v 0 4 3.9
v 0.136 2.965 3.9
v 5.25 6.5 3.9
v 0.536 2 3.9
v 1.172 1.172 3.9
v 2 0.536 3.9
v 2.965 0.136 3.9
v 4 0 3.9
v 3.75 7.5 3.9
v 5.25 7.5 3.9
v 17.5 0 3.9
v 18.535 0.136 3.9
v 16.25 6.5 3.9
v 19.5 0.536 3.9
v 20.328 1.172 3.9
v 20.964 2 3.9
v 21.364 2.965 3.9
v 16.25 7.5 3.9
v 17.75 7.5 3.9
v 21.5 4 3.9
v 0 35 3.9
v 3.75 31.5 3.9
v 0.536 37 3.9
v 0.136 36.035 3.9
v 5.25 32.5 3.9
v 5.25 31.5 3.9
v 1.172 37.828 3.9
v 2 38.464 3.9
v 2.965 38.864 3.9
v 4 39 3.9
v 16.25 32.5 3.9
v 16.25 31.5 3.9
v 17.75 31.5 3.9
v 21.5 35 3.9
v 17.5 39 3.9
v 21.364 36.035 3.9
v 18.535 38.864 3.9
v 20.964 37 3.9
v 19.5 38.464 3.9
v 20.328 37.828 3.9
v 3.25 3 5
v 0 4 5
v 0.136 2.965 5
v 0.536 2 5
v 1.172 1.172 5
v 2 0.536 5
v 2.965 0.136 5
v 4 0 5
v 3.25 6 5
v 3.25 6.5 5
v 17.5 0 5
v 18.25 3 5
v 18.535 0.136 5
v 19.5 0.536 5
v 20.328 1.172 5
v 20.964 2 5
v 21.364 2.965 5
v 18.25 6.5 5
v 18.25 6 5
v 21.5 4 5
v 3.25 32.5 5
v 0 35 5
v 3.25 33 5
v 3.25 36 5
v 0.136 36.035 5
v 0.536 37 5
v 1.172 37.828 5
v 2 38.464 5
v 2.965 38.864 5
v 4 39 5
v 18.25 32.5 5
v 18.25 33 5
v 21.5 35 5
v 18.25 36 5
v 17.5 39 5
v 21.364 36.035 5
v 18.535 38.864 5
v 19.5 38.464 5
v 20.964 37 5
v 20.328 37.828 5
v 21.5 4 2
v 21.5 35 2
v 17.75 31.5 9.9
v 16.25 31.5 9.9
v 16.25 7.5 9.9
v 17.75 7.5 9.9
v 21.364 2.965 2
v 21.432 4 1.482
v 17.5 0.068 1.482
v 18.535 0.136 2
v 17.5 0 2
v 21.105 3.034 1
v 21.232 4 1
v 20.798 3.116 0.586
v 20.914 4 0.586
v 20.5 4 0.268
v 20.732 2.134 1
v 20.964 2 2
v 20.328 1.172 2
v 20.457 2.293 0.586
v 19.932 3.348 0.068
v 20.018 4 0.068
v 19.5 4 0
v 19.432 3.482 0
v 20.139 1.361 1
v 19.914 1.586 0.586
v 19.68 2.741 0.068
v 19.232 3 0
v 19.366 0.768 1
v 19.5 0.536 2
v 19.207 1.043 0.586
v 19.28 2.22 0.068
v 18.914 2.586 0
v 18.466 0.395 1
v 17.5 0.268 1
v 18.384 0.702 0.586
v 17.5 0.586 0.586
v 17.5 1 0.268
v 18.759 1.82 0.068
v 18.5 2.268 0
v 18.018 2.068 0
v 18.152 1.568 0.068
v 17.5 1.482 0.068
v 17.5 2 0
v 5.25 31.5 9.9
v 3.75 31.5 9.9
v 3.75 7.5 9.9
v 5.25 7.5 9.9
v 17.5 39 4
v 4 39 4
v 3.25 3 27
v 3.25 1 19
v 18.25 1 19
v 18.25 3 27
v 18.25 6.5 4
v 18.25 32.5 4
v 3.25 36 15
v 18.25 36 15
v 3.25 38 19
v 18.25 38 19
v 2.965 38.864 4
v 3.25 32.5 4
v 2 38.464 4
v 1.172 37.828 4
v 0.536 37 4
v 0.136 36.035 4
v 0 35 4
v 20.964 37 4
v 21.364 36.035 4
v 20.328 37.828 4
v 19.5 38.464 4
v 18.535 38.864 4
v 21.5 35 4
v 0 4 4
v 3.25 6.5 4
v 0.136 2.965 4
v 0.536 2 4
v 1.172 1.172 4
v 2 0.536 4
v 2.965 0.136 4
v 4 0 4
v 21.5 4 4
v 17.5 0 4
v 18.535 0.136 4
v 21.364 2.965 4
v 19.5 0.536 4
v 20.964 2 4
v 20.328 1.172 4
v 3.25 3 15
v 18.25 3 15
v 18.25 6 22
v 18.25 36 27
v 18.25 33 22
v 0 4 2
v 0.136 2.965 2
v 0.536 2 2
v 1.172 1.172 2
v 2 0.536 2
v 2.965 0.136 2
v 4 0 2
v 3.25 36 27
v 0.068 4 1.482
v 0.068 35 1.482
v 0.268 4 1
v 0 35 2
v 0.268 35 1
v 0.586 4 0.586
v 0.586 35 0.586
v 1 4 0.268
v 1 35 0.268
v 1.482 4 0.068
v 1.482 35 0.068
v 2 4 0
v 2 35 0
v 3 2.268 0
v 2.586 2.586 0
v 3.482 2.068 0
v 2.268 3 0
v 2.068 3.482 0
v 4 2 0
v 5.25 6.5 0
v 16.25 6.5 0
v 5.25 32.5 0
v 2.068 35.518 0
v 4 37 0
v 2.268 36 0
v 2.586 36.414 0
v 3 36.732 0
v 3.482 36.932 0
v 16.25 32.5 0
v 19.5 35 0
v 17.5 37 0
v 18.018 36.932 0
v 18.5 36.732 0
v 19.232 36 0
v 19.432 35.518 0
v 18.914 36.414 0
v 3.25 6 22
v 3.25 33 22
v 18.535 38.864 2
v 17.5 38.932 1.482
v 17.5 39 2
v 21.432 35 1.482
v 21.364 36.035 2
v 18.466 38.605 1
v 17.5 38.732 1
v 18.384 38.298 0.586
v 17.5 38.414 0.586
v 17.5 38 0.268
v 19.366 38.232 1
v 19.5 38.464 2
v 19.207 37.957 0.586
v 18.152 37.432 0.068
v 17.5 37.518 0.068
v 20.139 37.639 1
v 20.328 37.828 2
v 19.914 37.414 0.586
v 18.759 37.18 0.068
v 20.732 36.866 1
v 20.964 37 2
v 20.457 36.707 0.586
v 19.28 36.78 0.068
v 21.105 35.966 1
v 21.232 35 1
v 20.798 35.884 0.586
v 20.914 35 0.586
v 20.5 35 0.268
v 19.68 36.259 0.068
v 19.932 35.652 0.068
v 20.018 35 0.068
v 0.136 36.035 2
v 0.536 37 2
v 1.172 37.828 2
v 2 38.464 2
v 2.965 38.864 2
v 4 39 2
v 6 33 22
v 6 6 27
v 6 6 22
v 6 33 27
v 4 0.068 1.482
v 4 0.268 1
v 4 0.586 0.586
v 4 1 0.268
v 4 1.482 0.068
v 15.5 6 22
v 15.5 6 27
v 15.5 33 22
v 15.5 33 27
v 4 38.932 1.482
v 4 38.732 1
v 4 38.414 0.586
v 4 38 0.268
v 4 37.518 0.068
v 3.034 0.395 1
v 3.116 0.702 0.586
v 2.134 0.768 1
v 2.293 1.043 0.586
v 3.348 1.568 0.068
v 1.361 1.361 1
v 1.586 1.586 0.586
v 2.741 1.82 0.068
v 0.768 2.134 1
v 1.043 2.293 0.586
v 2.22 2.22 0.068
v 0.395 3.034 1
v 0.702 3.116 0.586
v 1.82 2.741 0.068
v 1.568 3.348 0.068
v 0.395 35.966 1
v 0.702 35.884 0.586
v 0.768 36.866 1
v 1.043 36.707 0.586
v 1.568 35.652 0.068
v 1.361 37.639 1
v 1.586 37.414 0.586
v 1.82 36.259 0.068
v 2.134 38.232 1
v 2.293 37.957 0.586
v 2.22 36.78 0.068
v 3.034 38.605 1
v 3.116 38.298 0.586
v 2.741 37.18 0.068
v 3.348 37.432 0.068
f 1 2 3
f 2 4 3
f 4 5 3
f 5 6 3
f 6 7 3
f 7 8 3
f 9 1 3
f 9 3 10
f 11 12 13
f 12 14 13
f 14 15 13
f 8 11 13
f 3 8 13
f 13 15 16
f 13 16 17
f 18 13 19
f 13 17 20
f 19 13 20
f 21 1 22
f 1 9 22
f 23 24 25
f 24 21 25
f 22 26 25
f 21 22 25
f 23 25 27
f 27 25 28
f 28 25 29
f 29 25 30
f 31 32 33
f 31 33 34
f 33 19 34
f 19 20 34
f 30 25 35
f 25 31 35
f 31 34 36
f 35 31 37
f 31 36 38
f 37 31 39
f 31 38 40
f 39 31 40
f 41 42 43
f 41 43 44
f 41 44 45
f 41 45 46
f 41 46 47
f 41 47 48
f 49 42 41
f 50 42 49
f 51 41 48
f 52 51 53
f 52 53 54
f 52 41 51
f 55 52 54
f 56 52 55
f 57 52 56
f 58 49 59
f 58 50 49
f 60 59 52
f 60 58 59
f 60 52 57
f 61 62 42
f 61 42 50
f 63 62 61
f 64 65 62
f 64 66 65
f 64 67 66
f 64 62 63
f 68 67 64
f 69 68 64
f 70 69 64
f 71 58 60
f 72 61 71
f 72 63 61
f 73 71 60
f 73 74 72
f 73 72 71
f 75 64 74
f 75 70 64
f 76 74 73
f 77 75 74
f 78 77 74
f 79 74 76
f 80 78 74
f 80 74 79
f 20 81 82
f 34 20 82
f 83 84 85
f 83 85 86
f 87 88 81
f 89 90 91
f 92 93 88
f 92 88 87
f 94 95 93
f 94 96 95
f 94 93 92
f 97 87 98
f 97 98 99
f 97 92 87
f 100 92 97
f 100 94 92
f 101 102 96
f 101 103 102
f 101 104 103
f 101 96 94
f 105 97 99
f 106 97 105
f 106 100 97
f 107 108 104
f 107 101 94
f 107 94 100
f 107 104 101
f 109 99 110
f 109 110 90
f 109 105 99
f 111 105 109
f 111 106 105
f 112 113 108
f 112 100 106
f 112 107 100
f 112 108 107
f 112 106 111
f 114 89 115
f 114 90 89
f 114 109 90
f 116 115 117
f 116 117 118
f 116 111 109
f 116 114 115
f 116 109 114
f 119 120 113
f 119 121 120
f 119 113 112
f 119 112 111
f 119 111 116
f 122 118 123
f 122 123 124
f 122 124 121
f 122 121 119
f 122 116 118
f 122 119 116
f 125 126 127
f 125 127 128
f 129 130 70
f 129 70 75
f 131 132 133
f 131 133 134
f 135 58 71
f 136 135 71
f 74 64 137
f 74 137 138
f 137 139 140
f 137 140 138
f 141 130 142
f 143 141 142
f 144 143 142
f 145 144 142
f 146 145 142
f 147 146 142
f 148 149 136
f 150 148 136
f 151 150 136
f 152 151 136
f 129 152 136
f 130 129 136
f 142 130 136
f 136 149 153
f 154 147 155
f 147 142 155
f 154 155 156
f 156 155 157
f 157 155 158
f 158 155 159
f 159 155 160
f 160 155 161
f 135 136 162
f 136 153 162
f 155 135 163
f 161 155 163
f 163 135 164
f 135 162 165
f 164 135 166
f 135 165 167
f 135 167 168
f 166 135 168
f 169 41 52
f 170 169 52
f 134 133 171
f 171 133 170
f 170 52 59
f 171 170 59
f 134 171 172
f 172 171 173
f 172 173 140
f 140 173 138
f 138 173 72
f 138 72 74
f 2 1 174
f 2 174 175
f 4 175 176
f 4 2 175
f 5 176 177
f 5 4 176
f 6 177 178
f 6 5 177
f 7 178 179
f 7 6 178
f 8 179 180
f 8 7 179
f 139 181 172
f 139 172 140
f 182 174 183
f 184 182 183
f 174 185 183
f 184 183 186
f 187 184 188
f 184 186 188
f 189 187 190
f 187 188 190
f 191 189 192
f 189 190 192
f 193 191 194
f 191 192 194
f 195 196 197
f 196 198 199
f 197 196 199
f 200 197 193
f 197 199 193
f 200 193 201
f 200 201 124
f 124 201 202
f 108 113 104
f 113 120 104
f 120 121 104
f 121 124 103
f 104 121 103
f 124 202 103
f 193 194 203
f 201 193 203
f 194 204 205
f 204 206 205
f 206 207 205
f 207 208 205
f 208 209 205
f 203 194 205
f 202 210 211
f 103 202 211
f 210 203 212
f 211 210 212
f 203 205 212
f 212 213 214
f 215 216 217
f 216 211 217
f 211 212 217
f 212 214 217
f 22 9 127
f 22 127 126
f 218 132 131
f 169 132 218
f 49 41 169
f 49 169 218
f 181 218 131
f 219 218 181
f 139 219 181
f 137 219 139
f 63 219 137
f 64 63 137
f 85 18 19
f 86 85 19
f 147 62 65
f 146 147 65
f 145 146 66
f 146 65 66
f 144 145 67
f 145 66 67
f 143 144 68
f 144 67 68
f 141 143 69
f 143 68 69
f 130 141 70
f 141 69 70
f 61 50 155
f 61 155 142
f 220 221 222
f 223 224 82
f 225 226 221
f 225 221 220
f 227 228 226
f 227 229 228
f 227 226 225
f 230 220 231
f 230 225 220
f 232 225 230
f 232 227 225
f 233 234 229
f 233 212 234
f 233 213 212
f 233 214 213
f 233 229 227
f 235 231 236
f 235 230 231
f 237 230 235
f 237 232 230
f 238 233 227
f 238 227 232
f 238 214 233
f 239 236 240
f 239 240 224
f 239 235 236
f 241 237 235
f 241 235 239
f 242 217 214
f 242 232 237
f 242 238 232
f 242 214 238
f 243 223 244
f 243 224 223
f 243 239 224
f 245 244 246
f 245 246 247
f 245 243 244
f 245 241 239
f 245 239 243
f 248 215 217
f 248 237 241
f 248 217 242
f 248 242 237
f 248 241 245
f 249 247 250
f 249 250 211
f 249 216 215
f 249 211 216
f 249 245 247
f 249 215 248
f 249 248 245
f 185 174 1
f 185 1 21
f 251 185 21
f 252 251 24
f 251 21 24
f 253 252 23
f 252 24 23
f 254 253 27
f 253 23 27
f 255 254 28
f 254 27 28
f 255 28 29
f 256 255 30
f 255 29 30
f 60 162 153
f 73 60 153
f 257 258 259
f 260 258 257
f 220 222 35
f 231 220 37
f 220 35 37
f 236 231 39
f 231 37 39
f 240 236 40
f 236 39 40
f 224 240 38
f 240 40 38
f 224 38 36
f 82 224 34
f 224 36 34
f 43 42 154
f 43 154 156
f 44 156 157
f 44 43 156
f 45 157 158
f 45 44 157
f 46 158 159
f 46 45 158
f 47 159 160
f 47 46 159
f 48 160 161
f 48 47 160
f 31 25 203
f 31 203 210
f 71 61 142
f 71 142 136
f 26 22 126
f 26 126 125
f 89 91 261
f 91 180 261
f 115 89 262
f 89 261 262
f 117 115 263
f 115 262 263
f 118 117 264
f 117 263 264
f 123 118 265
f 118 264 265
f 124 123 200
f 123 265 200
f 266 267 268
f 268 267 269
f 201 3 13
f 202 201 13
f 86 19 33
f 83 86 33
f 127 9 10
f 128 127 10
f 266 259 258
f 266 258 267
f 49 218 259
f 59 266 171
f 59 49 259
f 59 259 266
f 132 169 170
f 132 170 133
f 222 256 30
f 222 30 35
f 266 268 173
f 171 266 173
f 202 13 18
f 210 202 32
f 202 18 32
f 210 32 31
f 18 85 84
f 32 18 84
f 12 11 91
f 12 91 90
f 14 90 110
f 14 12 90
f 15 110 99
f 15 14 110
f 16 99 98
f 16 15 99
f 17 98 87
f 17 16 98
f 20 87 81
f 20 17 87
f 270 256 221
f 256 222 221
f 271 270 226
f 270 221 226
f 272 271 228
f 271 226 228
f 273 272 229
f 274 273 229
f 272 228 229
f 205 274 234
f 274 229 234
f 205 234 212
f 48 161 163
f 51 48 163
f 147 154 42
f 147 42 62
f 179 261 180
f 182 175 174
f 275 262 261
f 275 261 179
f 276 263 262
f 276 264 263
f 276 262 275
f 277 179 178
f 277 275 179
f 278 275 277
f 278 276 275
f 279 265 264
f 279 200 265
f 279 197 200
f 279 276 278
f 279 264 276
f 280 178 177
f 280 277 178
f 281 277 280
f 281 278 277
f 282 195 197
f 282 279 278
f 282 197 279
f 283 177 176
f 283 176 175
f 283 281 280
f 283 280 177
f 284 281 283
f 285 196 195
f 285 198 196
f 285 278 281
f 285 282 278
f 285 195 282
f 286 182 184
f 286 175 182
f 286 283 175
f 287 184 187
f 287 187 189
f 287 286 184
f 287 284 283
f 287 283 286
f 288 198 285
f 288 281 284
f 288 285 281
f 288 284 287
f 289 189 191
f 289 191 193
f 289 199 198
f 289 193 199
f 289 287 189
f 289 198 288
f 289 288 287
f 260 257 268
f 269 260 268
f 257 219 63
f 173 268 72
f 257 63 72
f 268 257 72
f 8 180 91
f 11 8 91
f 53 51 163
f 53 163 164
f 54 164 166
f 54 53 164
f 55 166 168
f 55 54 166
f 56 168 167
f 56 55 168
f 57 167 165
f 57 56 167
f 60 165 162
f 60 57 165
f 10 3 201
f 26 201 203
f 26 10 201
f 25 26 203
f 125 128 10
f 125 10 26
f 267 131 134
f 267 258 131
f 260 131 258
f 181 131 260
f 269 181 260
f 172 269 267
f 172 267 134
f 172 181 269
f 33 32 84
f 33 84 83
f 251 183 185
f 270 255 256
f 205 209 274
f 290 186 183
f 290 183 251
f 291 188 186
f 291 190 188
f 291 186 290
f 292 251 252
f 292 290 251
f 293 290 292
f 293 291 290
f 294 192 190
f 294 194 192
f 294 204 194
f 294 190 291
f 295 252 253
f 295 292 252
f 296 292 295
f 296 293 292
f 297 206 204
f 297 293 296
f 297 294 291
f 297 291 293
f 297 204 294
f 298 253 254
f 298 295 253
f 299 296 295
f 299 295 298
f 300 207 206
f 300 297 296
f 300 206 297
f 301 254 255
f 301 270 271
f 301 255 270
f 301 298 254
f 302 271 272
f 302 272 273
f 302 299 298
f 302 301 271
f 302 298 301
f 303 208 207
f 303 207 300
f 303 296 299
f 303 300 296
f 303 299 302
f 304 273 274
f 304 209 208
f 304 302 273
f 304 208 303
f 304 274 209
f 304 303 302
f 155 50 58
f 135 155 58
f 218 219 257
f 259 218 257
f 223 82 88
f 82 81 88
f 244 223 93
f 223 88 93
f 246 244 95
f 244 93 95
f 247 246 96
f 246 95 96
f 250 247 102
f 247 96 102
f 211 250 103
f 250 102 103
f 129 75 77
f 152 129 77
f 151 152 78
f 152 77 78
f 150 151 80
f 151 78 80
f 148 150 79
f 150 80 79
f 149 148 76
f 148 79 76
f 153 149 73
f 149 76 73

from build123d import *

# Parameters (mm, degrees)
F0_W      = 21.5
F0_H      = 39
F1_DEPTH  = 5
F2_W      = 15
F2_H      = 3
F3_DEPTH  = 22
F5_DEPTH  = 15
F6_R      = 4
F7_R      = 2
F8_W      = 11
F8_H      = 26
F9_DEPTH  = 6
F10_W     = 31
F10_H     = 0.1
F10_W_2   = 5.1652195826
F10_W_3   = 13.8347804174
F11_DEPTH = 40
F12_W     = 2.75
F12_H     = 27.0109900199
F12_H_2   = 27.0146002918
F13_DEPTH = 5
F14_W     = 2
F14_H     = 26
F15_DEPTH = 1
F16_W     = 1.5
F16_H     = 24
F17_DEPTH = 6


with BuildPart() as f1:
    # F0 (on Top) → F1 (new body)
    with BuildSketch(Plane.XY):
        with Locations((10.75, 19.5)):
            Rectangle(F0_W, F0_H)
    extrude(amount=F1_DEPTH)

    # F2 (on face) → F3 (join)
    with BuildSketch(Plane.XY.offset(5)):
        with Locations((10.75, 34.5)):
            Rectangle(F2_W, F2_H)
        with Locations((10.75, 4.5)):
            Rectangle(F2_W, F2_H)
    extrude(amount=F3_DEPTH)

    # F4 (on face) → F5 (join)
    with BuildSketch(Plane(origin=(3.25, 0, 0), x_dir=(0, -1, 0), z_dir=(-1, 0, 0))):
        Polygon((-36, 15), (-36, 27), (-38, 19), align=None)
        Polygon((-1, 19), (-3, 27), (-3, 15), align=None)
    extrude(amount=-F5_DEPTH)

    # F6
    f6_edges = [f1.edges().sort_by_distance(p)[0] for p in [
        (0, 39, 2.5),
        (0, 0, 2.5),
        (21.5, 0, 2.5),
        (21.5, 39, 2.5),
    ]]
    fillet(f6_edges, radius=F6_R)

    # F7
    f7_edges = [f1.edges().sort_by_distance(p)[0] for p in [
        (0, 19.5, 0),
        (1.171573, 37.828427, 0),
        (1.171573, 1.171573, 0),
        (10.75, 39, 0),
        (10.75, 0, 0),
        (20.328427, 37.828427, 0),
        (20.328427, 1.171573, 0),
        (21.5, 19.5, 0),
    ]]
    fillet(f7_edges, radius=F7_R)

    # F8 (on face) → F9 (cut)
    with BuildSketch(Plane.XY.offset(5)):
        with Locations((10.75, 19.5)):
            Rectangle(F8_W, F8_H)
    extrude(amount=-F9_DEPTH, mode=Mode.SUBTRACT)

    # F10 (on face) → F11 (cut)
    with BuildSketch(Plane.YZ.offset(21.5)):
        with Locations((19.5, 3.95)):
            Rectangle(F10_W, F10_H)
        with Locations((1.4173902087, 3.95)):
            Rectangle(F10_W_2, F10_H)
        with Locations((41.9173902087, 3.95)):
            Rectangle(F10_W_3, F10_H)
    extrude(amount=-F11_DEPTH, mode=Mode.SUBTRACT)

    # F12 (on face) → F13 (join)
    with BuildSketch(Plane.XY.offset(27)):
        with Locations((16.875, 19.4945049901)):
            Rectangle(F12_W, F12_H)
        with Locations((4.625, 19.4926998541)):
            Rectangle(F12_W, F12_H_2)
    extrude(amount=-F13_DEPTH)

    # F14 (on face) → F15 (cut)
    with BuildSketch(Plane.XY.offset(5)):
        with Locations((17.25, 19.5)):
            Rectangle(F14_W, F14_H)
        with Locations((4.25, 19.5)):
            Rectangle(F14_W, F14_H)
    extrude(amount=-F15_DEPTH, mode=Mode.SUBTRACT)

    # F16 (on face) → F17 (join)
    with BuildSketch(Plane.XY.offset(3.9)):
        with Locations((17, 19.5)):
            Rectangle(F16_W, F16_H)
        with Locations((4.5, 19.5)):
            Rectangle(F16_W, F16_H)
    extrude(amount=F17_DEPTH)


solid = f1.part
